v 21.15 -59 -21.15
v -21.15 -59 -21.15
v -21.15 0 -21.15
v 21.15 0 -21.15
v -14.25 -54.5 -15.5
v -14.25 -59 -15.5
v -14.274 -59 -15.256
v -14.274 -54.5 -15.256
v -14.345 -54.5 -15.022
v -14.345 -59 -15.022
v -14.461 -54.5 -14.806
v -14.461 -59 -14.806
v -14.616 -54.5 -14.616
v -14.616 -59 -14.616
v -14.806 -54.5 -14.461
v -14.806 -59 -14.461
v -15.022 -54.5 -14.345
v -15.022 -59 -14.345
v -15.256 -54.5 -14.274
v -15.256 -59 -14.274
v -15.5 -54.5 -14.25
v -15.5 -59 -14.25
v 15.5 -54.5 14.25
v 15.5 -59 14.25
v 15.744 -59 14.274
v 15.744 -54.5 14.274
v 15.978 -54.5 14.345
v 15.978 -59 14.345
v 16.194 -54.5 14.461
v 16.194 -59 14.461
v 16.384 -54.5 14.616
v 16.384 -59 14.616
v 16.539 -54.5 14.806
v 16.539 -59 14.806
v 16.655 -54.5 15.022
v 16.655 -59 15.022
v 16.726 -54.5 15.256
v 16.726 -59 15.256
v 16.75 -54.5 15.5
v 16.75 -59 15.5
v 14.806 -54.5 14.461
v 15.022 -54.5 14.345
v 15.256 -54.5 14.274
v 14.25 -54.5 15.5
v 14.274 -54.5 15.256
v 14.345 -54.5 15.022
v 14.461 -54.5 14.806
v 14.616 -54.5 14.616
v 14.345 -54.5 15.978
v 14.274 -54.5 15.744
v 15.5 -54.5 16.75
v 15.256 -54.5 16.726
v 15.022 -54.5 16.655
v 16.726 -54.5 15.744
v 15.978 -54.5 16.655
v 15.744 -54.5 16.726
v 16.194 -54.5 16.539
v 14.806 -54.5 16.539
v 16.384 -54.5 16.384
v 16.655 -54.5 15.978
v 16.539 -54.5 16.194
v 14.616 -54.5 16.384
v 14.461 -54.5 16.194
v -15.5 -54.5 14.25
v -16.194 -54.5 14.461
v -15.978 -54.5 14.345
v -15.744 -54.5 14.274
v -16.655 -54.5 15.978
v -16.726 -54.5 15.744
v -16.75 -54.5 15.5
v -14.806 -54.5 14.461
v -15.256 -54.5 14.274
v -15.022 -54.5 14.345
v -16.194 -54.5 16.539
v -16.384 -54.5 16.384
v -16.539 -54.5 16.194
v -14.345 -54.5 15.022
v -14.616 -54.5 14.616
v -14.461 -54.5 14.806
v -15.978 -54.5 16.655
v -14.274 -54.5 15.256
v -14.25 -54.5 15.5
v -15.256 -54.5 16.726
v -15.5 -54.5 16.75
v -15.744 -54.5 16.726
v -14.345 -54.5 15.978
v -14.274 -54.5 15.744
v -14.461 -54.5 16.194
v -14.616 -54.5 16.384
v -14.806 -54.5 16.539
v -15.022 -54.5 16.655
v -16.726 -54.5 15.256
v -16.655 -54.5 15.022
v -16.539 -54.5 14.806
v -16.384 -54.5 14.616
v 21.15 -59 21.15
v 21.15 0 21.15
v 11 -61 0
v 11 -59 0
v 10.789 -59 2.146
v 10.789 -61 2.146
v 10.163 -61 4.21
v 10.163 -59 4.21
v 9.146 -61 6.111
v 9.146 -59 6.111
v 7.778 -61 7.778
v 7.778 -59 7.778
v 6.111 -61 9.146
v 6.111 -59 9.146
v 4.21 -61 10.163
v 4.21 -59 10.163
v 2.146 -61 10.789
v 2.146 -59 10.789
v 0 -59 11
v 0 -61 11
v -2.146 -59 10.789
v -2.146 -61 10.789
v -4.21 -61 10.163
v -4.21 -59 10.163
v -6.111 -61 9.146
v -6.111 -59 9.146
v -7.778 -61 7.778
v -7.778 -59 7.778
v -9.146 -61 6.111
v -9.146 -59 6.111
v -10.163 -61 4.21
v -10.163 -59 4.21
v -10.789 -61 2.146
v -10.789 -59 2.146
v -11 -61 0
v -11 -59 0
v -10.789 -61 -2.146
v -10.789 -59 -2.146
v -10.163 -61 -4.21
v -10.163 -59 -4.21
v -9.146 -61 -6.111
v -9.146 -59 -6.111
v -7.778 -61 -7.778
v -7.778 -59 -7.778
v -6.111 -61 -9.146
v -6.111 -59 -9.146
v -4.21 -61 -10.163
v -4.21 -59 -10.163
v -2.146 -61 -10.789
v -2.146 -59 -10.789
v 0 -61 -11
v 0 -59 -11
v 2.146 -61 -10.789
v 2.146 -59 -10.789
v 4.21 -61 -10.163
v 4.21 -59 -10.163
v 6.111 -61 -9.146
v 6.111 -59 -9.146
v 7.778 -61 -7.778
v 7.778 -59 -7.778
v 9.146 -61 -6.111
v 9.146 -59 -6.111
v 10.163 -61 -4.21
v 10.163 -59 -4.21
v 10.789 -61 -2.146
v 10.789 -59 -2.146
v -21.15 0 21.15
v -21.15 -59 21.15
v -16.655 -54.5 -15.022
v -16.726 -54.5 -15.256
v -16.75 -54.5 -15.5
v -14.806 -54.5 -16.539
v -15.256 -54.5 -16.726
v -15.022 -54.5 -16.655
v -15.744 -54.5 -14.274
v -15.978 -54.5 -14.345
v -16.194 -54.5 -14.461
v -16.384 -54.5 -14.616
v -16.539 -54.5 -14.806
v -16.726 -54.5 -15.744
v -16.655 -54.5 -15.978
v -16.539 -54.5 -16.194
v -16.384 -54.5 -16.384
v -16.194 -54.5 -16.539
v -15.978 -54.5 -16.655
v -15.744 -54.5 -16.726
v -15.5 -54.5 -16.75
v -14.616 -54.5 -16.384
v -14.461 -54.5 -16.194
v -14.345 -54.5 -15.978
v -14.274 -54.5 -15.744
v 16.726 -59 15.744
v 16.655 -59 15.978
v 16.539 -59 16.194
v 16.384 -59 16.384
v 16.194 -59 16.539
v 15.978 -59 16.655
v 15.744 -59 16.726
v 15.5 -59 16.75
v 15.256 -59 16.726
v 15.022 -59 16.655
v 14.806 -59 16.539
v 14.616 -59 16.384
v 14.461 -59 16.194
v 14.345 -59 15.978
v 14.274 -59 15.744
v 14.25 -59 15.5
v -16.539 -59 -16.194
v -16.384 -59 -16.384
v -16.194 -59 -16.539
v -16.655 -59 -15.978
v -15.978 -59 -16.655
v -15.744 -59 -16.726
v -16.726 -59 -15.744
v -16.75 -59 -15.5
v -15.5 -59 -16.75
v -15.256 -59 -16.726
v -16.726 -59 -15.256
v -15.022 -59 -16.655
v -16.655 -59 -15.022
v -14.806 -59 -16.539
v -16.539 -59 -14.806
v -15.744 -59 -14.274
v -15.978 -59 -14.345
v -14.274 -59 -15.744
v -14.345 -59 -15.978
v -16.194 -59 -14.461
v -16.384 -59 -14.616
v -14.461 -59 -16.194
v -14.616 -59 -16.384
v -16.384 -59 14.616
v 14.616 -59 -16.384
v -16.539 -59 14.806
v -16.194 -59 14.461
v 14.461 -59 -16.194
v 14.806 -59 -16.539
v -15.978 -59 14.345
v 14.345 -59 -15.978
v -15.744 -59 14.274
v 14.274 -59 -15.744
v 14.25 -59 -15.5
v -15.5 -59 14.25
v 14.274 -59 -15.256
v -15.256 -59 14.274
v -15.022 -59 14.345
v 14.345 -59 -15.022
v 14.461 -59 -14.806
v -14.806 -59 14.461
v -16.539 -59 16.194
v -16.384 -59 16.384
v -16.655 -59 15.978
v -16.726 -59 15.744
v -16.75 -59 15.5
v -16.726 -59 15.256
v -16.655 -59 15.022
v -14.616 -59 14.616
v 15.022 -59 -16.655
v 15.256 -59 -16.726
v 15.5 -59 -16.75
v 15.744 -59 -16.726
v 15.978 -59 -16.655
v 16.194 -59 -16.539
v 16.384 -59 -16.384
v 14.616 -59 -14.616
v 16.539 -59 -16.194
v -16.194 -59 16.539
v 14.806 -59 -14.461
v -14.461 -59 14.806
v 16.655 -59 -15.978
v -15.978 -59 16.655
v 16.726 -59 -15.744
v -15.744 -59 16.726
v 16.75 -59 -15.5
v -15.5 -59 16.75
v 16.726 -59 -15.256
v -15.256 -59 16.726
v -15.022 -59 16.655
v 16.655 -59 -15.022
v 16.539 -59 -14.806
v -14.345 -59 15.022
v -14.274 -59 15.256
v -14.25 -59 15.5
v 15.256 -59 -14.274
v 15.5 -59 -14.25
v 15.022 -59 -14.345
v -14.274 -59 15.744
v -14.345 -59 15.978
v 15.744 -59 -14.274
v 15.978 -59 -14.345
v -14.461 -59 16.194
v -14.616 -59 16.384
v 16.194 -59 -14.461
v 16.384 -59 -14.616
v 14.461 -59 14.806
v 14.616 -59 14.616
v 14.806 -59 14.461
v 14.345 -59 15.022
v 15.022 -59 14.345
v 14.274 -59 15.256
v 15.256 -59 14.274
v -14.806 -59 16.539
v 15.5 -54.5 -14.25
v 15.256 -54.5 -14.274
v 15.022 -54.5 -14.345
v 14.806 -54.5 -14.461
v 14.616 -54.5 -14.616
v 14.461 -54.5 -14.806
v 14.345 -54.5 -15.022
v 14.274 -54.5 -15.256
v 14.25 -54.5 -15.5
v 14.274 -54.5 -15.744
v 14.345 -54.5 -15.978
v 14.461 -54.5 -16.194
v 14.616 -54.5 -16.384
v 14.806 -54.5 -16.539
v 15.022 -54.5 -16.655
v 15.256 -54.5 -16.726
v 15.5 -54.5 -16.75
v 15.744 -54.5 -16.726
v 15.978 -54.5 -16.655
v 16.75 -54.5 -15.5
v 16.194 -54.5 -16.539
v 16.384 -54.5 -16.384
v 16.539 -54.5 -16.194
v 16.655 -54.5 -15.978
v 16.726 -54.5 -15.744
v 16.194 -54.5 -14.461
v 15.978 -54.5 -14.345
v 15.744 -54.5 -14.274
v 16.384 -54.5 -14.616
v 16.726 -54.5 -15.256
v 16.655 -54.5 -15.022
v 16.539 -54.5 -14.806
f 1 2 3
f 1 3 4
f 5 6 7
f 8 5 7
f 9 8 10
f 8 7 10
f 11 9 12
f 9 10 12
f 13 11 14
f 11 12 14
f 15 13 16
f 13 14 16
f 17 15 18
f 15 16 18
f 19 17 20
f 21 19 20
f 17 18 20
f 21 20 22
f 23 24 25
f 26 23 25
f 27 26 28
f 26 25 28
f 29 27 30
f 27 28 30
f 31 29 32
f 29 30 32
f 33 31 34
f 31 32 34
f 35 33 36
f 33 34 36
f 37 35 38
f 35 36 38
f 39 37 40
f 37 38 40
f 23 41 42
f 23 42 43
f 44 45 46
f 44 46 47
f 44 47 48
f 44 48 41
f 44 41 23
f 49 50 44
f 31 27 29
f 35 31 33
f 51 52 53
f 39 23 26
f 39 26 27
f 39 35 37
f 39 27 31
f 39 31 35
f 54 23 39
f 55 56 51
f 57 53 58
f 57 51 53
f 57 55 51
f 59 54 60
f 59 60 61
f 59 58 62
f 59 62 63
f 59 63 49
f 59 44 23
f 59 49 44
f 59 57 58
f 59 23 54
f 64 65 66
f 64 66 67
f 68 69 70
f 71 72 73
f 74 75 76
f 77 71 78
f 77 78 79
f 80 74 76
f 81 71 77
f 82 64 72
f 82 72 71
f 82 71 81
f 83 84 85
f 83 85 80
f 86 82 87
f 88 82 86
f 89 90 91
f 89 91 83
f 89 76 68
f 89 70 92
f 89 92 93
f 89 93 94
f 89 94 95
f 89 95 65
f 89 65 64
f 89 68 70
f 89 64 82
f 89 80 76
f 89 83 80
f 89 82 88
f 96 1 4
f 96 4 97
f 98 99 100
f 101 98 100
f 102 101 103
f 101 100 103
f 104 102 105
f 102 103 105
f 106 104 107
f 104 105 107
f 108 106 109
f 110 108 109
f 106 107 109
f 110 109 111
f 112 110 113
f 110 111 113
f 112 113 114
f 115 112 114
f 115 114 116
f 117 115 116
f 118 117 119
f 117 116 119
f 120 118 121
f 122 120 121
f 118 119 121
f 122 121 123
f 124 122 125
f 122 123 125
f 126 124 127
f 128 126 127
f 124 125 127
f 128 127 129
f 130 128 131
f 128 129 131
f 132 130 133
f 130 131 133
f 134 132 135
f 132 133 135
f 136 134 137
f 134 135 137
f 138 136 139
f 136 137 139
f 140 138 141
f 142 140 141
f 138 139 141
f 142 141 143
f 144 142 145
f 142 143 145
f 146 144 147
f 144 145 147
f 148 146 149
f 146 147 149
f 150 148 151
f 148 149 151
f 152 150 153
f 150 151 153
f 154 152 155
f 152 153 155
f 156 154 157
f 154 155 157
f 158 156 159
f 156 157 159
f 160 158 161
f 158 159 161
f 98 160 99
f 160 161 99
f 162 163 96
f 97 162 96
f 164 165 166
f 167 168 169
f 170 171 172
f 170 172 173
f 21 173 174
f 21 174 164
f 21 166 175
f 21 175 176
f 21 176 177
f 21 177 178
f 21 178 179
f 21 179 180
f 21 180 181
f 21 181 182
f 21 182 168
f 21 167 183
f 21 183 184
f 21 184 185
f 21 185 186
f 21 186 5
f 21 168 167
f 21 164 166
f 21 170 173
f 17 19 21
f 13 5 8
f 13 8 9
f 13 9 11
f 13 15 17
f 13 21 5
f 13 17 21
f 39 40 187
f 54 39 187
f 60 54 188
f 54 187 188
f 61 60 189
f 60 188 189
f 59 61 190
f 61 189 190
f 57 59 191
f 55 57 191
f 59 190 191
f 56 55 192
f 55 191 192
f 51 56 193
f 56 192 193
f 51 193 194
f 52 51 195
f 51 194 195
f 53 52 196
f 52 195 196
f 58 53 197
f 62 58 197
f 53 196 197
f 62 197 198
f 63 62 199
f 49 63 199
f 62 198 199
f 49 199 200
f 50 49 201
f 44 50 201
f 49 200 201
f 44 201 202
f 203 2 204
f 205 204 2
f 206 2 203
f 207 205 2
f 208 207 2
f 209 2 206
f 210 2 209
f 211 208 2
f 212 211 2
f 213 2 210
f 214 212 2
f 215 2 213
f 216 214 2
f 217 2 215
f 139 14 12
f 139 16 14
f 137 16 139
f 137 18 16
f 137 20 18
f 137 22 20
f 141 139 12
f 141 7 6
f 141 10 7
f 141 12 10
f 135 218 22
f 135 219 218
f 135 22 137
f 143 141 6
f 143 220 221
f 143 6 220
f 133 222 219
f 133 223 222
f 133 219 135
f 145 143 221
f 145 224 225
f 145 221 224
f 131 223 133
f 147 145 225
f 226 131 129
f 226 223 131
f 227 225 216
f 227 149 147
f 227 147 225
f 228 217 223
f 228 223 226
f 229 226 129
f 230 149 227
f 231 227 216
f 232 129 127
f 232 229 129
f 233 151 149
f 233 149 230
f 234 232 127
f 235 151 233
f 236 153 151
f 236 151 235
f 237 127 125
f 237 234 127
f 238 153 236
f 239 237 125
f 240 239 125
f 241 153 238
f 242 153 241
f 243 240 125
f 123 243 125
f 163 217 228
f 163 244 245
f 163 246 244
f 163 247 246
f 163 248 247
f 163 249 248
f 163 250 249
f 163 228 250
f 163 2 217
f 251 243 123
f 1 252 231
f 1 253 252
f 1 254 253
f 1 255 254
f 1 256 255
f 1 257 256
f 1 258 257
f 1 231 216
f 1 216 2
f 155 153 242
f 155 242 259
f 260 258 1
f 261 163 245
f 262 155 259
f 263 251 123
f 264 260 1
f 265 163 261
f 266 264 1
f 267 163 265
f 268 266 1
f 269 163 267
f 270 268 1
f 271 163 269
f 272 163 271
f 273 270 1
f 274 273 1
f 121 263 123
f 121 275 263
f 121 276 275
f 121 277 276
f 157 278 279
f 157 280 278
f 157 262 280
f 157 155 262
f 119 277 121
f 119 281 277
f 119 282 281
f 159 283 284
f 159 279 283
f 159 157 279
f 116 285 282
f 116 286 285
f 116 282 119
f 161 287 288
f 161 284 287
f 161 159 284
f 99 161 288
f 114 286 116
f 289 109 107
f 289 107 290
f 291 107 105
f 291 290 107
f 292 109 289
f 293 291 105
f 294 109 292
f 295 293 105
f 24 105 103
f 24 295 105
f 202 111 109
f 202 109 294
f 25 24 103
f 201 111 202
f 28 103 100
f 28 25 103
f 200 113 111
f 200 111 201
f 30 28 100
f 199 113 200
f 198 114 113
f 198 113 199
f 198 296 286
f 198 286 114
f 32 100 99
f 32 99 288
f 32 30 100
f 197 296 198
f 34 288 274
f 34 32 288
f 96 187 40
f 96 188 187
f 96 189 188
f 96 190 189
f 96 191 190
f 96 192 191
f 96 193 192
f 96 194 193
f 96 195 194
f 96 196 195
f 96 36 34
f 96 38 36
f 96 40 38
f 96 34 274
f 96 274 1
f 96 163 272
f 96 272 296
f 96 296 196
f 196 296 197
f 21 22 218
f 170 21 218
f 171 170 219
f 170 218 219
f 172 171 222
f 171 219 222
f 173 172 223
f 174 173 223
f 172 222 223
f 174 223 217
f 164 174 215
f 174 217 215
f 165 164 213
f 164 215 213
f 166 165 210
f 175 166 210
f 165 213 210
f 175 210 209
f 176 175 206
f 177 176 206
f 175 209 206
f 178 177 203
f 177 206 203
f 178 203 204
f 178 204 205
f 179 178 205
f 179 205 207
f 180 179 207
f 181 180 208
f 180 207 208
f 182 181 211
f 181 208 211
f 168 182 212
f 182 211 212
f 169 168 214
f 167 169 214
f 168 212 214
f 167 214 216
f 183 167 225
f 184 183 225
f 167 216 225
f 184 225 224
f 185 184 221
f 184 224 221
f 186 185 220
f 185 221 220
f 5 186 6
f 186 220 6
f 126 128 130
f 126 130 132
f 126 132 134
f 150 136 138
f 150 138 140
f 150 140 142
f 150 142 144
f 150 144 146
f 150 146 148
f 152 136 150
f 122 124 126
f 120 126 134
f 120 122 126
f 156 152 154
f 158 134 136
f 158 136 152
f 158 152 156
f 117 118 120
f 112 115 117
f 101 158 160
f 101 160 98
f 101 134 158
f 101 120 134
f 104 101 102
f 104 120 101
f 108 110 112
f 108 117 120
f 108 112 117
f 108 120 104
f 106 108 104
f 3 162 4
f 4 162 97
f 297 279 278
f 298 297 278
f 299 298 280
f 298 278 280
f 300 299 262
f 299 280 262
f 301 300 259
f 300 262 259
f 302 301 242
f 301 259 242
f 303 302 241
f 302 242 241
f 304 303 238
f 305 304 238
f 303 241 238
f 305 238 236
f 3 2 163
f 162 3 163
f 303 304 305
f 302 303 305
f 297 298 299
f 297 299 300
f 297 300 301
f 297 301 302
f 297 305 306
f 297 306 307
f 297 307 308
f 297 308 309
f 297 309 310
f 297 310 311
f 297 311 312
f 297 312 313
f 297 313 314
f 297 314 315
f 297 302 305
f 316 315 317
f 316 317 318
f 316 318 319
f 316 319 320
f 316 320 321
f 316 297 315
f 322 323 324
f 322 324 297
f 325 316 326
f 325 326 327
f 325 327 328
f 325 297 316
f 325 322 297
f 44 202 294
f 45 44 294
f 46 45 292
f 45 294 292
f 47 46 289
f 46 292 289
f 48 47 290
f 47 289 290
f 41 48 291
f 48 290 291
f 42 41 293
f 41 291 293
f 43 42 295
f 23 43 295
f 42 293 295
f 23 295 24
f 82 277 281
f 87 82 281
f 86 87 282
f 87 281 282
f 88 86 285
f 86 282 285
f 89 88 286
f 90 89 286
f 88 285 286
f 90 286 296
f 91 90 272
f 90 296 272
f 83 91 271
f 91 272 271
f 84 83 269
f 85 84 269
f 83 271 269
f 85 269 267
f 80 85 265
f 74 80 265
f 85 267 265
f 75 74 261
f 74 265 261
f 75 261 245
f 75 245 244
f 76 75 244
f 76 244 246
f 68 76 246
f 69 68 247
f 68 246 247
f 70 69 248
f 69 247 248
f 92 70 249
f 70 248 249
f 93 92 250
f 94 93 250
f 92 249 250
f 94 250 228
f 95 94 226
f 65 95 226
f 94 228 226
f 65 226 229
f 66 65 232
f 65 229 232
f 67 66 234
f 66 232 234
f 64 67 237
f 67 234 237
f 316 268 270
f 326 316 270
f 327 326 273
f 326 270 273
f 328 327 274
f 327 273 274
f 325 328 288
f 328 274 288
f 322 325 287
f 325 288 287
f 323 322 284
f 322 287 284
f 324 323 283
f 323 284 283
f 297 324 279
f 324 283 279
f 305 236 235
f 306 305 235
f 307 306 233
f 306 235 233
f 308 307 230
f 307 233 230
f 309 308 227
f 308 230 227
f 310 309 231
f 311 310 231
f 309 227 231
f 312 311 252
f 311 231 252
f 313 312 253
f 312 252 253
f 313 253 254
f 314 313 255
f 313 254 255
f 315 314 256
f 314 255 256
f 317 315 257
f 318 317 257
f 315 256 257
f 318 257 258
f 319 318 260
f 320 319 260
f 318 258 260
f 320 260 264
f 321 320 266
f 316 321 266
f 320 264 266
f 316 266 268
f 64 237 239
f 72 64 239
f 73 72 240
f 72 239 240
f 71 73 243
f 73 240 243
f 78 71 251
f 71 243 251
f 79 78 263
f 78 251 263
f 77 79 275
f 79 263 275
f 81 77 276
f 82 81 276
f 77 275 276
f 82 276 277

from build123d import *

# Parameters (mm, degrees)
F0_W      = 42.3
F0_H      = 42.3
F1_DEPTH  = 59
F2_R      = 11
F3_DEPTH  = 2
F4_R      = 2.5
F5_DEPTH  = 22
F7_DEPTH  = 15
F9_DEPTH  = 4.5
F10_DEPTH = 22
F11_DEPTH = 7


with BuildPart() as f1:
    # F0 (on Front) → F1 (new body)
    with BuildSketch(Plane.XZ):
        Rectangle(F0_W, F0_H)
    extrude(amount=F1_DEPTH)

    # F2 (on face) → F3 (join)
    with BuildSketch(Plane.XZ.offset(59)):
        Circle(F2_R)
    extrude(amount=F3_DEPTH)

    # F4 (on face) → F5 (join)
    with BuildSketch(Plane.XZ.offset(61)):
        Circle(F4_R)
    extrude(amount=F5_DEPTH)

    # F6 (on face) → F7 (cut)
    with BuildSketch(Plane.XZ.offset(83)):
        with BuildLine():
            ThreePointArc((0, 2.5), (-0.790569415, 2.3717082451), (-1.5, 2))
            Line((-1.5, 2), (0, 2))
            Line((0, 2), (0, 2.5))
        make_face()
        with BuildLine():
            Line((0, 2.5), (0, 2))
            Line((0, 2), (1.5, 2))
            ThreePointArc((1.5, 2), (0.790569415, 2.3717082451), (0, 2.5))
        make_face()
    extrude(amount=-F7_DEPTH, mode=Mode.SUBTRACT)

    # F8 (on face) → F9 (cut)
    with BuildSketch(Plane.XZ.offset(59)):
        with BuildLine():
            ThreePointArc((16.75, 15.5), (15.5, 16.75), (14.25, 15.5))
            Line((14.25, 15.5), (15.5, 15.5))
            Line((15.5, 15.5), (15.5, 14.25))
            ThreePointArc((15.5, 14.25), (16.3838834765, 14.6161165235), (16.75, 15.5))
        make_face()
        with BuildLine():
            Line((15.5, 15.5), (14.25, 15.5))
            ThreePointArc((14.25, 15.5), (14.6161165235, 14.6161165235), (15.5, 14.25))
            Line((15.5, 14.25), (15.5, 15.5))
        make_face()
        with BuildLine():
            Line((-15.5, 14.25), (-15.5, 15.5))
            Line((-15.5, 15.5), (-14.25, 15.5))
            ThreePointArc((-14.25, 15.5), (-16.3838834765, 16.3838834765), (-15.5, 14.25))
        make_face()
        with BuildLine():
            Line((-14.25, 15.5), (-15.5, 15.5))
            Line((-15.5, 15.5), (-15.5, 14.25))
            ThreePointArc((-15.5, 14.25), (-14.6161165235, 14.6161165235), (-14.25, 15.5))
        make_face()
        with BuildLine():
            Line((-15.5, -15.5), (-15.5, -14.25))
            ThreePointArc((-15.5, -14.25), (-16.3838834765, -16.3838834765), (-14.25, -15.5))
            Line((-14.25, -15.5), (-15.5, -15.5))
        make_face()
        with BuildLine():
            ThreePointArc((-14.25, -15.5), (-14.6161165235, -14.6161165235), (-15.5, -14.25))
            Line((-15.5, -14.25), (-15.5, -15.5))
            Line((-15.5, -15.5), (-14.25, -15.5))
        make_face()
        with BuildLine():
            Line((15.5, -15.5), (15.5, -14.25))
            ThreePointArc((15.5, -14.25), (14.6161165235, -14.6161165235), (14.25, -15.5))
            Line((14.25, -15.5), (15.5, -15.5))
        make_face()
        with BuildLine():
            ThreePointArc((16.75, -15.5), (16.3838834765, -14.6161165235), (15.5, -14.25))
            Line((15.5, -14.25), (15.5, -15.5))
            Line((15.5, -15.5), (14.25, -15.5))
            ThreePointArc((14.25, -15.5), (15.5, -16.75), (16.75, -15.5))
        make_face()
    extrude(amount=-F9_DEPTH, mode=Mode.SUBTRACT)

    # F10 (cut): a face of the model
    f10_faces = [f1.faces().sort_by_distance(p)[0] for p in [
        (0, -83, -0.120882785),
    ]]
    extrude(f10_faces, amount=-F10_DEPTH, mode=Mode.SUBTRACT)

    # F11 (cut): a face of the model
    f11_faces = [f1.faces().sort_by_distance(p)[0] for p in [
        (0, -68, 2.2018199305),
    ]]
    extrude(f11_faces, amount=-F11_DEPTH, mode=Mode.SUBTRACT)


solid = f1.part
